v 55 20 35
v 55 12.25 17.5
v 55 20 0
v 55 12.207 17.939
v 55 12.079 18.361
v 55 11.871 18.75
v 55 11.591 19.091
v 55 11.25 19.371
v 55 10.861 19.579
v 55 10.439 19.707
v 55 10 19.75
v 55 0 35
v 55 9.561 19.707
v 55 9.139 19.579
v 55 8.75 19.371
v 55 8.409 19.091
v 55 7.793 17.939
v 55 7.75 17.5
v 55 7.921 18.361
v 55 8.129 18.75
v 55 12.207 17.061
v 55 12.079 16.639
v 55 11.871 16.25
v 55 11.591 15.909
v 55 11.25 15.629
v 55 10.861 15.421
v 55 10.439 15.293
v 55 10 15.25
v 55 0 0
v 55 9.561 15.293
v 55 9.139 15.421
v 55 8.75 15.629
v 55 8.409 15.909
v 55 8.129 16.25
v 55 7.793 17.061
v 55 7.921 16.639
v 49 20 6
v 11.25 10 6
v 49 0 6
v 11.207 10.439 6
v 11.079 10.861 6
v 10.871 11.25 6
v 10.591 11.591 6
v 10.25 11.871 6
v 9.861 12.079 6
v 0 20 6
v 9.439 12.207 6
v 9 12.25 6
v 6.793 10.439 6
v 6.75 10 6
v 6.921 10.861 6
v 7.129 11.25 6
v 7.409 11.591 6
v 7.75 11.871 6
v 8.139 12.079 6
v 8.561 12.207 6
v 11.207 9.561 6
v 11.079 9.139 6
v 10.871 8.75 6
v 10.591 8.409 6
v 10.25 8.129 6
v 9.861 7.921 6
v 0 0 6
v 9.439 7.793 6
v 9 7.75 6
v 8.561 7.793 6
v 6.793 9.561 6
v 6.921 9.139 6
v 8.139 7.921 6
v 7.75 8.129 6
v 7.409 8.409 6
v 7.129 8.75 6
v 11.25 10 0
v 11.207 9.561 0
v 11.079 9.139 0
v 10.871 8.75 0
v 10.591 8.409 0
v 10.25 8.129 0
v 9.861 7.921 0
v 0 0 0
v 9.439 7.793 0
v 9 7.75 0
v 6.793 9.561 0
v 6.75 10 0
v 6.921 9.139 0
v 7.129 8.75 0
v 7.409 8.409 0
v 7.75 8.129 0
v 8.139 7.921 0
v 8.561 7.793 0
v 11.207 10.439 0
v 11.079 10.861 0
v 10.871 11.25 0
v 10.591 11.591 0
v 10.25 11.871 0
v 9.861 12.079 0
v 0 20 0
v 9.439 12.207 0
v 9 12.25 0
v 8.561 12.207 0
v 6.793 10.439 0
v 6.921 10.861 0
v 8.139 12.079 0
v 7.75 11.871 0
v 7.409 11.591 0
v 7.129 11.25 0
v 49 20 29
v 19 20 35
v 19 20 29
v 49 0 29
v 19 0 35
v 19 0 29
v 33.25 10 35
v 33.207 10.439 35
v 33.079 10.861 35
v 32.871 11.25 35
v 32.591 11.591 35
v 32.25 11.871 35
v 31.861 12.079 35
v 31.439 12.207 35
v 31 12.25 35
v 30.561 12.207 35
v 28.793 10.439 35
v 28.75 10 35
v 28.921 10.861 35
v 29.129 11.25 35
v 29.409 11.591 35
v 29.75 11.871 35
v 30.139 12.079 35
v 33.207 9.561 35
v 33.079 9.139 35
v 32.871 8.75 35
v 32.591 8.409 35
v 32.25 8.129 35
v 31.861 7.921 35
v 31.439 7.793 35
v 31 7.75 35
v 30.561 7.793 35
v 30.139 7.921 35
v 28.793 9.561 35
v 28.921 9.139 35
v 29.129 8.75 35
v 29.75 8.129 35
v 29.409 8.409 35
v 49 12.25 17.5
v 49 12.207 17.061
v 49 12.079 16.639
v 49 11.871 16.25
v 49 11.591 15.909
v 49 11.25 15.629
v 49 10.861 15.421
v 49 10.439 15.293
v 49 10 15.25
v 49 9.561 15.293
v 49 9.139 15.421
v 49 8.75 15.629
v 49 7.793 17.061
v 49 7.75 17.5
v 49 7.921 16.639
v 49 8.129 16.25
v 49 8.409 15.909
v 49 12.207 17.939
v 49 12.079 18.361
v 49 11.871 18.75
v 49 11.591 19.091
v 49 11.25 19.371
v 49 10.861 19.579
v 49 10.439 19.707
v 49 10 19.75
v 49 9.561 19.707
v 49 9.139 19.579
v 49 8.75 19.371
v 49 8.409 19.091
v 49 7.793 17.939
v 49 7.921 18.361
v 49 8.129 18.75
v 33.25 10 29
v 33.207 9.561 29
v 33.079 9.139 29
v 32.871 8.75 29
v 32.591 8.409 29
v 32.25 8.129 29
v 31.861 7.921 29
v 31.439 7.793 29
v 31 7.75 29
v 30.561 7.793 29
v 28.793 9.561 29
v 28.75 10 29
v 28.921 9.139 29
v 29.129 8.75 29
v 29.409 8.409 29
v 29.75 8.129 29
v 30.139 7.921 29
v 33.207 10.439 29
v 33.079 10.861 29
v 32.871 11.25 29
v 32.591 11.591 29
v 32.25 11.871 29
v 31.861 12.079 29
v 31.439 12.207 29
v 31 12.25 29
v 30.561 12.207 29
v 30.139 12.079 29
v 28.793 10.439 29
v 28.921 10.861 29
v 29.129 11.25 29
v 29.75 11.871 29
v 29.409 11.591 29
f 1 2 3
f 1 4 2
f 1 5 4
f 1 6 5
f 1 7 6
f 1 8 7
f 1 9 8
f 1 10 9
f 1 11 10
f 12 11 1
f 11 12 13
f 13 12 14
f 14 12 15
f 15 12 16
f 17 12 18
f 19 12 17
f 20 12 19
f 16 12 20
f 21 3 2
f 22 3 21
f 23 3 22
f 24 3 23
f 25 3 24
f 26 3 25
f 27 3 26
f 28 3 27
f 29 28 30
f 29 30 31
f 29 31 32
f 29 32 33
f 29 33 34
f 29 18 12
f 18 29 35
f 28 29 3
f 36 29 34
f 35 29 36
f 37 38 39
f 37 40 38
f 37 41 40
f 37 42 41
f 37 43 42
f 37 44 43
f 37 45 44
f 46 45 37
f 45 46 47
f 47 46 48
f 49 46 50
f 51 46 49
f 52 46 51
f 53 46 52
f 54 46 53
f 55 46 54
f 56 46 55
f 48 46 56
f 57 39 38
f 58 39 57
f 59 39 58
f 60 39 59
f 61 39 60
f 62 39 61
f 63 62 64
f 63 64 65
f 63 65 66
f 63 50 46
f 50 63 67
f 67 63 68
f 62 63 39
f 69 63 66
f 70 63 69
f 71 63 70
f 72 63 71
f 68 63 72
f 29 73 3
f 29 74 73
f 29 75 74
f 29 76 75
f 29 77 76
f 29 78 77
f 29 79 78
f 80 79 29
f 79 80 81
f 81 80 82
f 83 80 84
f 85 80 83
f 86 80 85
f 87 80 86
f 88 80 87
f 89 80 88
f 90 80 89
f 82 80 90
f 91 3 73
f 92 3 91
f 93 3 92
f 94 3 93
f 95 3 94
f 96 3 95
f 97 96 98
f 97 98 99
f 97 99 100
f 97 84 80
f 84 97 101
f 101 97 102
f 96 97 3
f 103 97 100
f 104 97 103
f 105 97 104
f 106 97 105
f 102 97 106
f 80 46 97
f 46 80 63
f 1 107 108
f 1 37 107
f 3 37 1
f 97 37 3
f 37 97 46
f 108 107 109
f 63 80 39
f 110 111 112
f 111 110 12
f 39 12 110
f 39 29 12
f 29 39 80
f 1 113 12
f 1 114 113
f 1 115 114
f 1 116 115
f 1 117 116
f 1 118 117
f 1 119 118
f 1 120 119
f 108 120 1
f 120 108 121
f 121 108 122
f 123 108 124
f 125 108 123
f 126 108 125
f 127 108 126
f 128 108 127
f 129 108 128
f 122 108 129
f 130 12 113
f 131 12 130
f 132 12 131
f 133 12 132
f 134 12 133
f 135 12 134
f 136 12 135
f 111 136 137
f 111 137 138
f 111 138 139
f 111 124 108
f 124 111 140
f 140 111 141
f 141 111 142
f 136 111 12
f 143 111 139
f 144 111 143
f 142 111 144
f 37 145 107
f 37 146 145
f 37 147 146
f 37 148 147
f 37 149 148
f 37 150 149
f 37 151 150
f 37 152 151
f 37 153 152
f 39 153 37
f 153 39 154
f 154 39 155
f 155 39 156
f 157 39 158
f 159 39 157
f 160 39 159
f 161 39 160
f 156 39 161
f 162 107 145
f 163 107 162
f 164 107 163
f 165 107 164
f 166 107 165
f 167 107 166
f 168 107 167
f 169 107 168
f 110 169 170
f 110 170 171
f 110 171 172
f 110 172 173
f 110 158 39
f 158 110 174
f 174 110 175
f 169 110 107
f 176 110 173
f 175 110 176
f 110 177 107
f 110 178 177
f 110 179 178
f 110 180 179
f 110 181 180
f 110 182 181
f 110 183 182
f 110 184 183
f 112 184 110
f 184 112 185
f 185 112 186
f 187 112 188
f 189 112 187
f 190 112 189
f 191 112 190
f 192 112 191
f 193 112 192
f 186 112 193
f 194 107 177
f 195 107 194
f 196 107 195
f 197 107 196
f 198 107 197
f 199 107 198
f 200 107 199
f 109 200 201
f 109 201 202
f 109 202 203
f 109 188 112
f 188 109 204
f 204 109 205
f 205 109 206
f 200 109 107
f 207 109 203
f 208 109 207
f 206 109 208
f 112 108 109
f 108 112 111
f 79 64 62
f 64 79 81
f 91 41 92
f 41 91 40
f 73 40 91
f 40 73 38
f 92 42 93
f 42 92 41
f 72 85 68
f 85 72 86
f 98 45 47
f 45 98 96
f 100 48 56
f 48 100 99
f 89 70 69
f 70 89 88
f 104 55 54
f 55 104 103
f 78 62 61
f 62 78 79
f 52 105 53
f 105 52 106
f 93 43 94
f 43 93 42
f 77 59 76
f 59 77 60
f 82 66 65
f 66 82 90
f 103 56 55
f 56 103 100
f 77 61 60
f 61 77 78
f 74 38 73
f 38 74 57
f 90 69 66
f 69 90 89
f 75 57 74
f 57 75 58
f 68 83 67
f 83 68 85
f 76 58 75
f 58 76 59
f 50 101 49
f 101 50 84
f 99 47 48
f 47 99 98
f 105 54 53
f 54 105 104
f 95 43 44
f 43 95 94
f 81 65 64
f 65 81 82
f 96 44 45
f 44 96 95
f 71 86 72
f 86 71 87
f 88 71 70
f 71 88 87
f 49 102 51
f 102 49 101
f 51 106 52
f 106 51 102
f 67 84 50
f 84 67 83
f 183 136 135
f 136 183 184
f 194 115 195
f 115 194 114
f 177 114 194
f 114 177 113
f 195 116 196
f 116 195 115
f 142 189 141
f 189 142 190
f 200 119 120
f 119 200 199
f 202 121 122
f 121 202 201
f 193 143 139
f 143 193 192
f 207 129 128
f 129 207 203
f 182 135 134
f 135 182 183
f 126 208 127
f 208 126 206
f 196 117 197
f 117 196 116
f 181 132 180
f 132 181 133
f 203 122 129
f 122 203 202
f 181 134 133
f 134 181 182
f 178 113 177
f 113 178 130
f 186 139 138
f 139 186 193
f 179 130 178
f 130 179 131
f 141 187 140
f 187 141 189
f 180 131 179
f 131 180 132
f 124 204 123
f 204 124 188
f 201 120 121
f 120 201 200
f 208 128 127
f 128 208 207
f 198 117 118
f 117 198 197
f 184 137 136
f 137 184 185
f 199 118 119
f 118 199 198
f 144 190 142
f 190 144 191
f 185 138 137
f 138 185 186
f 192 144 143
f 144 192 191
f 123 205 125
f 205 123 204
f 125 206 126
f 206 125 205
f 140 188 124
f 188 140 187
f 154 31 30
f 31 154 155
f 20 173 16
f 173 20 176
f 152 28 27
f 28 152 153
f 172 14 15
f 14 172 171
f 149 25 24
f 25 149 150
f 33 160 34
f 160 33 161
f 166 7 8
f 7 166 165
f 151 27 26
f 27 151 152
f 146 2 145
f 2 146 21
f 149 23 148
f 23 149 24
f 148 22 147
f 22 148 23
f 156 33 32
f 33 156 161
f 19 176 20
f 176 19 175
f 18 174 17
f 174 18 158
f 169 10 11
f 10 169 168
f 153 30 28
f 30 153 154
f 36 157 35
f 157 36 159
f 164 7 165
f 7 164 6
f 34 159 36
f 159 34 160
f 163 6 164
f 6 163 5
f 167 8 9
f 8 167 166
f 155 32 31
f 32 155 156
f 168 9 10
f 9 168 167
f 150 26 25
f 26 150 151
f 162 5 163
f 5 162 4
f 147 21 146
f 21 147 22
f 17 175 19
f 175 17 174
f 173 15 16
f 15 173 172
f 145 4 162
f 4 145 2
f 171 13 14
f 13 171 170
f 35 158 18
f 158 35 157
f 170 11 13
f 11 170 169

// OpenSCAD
$fn = 32;

// ----------------------------------------------------------------------
// Z-bracket: 55 x 20 x 35 mm
// ----------------------------------------------------------------------

// --- parameters (mm) ---
foot_len = 55;            // lower foot length, X
top_len = 30;             // upper foot length, X
depth = 20;               // bracket width, Y
step_h = 35;              // overall rise, Z
plate_t = 6;              // plate thickness
hole_d = 4.5;             // clearance for M4

module hole_z(px, py, z0) {
  translate([px, py, z0 - 2.5]) cylinder(h = plate_t + 5, d = hole_d);
}
module hole_x(py, pz) {
  translate([-2.5, py, pz]) rotate([0, 90, 0]) cylinder(h = plate_t + 5, d = hole_d);
}

difference() {
  union() {
    cube([foot_len, depth, plate_t]);
    /* web, overlapping the lower foot */
    translate([foot_len - plate_t, 0, 0]) cube([plate_t, depth, step_h]);
    /* upper foot, sunk into the web */
    translate([foot_len - plate_t - top_len, 0, step_h - plate_t]) cube([top_len + plate_t, depth, plate_t]);
  }
  hole_z(9, 10, 0);
  translate([foot_len - plate_t - 18, 0, 0]) hole_z(0, 10, step_h - plate_t);
  translate([foot_len - plate_t, 0, 0]) hole_x(10, 17.5);
}
